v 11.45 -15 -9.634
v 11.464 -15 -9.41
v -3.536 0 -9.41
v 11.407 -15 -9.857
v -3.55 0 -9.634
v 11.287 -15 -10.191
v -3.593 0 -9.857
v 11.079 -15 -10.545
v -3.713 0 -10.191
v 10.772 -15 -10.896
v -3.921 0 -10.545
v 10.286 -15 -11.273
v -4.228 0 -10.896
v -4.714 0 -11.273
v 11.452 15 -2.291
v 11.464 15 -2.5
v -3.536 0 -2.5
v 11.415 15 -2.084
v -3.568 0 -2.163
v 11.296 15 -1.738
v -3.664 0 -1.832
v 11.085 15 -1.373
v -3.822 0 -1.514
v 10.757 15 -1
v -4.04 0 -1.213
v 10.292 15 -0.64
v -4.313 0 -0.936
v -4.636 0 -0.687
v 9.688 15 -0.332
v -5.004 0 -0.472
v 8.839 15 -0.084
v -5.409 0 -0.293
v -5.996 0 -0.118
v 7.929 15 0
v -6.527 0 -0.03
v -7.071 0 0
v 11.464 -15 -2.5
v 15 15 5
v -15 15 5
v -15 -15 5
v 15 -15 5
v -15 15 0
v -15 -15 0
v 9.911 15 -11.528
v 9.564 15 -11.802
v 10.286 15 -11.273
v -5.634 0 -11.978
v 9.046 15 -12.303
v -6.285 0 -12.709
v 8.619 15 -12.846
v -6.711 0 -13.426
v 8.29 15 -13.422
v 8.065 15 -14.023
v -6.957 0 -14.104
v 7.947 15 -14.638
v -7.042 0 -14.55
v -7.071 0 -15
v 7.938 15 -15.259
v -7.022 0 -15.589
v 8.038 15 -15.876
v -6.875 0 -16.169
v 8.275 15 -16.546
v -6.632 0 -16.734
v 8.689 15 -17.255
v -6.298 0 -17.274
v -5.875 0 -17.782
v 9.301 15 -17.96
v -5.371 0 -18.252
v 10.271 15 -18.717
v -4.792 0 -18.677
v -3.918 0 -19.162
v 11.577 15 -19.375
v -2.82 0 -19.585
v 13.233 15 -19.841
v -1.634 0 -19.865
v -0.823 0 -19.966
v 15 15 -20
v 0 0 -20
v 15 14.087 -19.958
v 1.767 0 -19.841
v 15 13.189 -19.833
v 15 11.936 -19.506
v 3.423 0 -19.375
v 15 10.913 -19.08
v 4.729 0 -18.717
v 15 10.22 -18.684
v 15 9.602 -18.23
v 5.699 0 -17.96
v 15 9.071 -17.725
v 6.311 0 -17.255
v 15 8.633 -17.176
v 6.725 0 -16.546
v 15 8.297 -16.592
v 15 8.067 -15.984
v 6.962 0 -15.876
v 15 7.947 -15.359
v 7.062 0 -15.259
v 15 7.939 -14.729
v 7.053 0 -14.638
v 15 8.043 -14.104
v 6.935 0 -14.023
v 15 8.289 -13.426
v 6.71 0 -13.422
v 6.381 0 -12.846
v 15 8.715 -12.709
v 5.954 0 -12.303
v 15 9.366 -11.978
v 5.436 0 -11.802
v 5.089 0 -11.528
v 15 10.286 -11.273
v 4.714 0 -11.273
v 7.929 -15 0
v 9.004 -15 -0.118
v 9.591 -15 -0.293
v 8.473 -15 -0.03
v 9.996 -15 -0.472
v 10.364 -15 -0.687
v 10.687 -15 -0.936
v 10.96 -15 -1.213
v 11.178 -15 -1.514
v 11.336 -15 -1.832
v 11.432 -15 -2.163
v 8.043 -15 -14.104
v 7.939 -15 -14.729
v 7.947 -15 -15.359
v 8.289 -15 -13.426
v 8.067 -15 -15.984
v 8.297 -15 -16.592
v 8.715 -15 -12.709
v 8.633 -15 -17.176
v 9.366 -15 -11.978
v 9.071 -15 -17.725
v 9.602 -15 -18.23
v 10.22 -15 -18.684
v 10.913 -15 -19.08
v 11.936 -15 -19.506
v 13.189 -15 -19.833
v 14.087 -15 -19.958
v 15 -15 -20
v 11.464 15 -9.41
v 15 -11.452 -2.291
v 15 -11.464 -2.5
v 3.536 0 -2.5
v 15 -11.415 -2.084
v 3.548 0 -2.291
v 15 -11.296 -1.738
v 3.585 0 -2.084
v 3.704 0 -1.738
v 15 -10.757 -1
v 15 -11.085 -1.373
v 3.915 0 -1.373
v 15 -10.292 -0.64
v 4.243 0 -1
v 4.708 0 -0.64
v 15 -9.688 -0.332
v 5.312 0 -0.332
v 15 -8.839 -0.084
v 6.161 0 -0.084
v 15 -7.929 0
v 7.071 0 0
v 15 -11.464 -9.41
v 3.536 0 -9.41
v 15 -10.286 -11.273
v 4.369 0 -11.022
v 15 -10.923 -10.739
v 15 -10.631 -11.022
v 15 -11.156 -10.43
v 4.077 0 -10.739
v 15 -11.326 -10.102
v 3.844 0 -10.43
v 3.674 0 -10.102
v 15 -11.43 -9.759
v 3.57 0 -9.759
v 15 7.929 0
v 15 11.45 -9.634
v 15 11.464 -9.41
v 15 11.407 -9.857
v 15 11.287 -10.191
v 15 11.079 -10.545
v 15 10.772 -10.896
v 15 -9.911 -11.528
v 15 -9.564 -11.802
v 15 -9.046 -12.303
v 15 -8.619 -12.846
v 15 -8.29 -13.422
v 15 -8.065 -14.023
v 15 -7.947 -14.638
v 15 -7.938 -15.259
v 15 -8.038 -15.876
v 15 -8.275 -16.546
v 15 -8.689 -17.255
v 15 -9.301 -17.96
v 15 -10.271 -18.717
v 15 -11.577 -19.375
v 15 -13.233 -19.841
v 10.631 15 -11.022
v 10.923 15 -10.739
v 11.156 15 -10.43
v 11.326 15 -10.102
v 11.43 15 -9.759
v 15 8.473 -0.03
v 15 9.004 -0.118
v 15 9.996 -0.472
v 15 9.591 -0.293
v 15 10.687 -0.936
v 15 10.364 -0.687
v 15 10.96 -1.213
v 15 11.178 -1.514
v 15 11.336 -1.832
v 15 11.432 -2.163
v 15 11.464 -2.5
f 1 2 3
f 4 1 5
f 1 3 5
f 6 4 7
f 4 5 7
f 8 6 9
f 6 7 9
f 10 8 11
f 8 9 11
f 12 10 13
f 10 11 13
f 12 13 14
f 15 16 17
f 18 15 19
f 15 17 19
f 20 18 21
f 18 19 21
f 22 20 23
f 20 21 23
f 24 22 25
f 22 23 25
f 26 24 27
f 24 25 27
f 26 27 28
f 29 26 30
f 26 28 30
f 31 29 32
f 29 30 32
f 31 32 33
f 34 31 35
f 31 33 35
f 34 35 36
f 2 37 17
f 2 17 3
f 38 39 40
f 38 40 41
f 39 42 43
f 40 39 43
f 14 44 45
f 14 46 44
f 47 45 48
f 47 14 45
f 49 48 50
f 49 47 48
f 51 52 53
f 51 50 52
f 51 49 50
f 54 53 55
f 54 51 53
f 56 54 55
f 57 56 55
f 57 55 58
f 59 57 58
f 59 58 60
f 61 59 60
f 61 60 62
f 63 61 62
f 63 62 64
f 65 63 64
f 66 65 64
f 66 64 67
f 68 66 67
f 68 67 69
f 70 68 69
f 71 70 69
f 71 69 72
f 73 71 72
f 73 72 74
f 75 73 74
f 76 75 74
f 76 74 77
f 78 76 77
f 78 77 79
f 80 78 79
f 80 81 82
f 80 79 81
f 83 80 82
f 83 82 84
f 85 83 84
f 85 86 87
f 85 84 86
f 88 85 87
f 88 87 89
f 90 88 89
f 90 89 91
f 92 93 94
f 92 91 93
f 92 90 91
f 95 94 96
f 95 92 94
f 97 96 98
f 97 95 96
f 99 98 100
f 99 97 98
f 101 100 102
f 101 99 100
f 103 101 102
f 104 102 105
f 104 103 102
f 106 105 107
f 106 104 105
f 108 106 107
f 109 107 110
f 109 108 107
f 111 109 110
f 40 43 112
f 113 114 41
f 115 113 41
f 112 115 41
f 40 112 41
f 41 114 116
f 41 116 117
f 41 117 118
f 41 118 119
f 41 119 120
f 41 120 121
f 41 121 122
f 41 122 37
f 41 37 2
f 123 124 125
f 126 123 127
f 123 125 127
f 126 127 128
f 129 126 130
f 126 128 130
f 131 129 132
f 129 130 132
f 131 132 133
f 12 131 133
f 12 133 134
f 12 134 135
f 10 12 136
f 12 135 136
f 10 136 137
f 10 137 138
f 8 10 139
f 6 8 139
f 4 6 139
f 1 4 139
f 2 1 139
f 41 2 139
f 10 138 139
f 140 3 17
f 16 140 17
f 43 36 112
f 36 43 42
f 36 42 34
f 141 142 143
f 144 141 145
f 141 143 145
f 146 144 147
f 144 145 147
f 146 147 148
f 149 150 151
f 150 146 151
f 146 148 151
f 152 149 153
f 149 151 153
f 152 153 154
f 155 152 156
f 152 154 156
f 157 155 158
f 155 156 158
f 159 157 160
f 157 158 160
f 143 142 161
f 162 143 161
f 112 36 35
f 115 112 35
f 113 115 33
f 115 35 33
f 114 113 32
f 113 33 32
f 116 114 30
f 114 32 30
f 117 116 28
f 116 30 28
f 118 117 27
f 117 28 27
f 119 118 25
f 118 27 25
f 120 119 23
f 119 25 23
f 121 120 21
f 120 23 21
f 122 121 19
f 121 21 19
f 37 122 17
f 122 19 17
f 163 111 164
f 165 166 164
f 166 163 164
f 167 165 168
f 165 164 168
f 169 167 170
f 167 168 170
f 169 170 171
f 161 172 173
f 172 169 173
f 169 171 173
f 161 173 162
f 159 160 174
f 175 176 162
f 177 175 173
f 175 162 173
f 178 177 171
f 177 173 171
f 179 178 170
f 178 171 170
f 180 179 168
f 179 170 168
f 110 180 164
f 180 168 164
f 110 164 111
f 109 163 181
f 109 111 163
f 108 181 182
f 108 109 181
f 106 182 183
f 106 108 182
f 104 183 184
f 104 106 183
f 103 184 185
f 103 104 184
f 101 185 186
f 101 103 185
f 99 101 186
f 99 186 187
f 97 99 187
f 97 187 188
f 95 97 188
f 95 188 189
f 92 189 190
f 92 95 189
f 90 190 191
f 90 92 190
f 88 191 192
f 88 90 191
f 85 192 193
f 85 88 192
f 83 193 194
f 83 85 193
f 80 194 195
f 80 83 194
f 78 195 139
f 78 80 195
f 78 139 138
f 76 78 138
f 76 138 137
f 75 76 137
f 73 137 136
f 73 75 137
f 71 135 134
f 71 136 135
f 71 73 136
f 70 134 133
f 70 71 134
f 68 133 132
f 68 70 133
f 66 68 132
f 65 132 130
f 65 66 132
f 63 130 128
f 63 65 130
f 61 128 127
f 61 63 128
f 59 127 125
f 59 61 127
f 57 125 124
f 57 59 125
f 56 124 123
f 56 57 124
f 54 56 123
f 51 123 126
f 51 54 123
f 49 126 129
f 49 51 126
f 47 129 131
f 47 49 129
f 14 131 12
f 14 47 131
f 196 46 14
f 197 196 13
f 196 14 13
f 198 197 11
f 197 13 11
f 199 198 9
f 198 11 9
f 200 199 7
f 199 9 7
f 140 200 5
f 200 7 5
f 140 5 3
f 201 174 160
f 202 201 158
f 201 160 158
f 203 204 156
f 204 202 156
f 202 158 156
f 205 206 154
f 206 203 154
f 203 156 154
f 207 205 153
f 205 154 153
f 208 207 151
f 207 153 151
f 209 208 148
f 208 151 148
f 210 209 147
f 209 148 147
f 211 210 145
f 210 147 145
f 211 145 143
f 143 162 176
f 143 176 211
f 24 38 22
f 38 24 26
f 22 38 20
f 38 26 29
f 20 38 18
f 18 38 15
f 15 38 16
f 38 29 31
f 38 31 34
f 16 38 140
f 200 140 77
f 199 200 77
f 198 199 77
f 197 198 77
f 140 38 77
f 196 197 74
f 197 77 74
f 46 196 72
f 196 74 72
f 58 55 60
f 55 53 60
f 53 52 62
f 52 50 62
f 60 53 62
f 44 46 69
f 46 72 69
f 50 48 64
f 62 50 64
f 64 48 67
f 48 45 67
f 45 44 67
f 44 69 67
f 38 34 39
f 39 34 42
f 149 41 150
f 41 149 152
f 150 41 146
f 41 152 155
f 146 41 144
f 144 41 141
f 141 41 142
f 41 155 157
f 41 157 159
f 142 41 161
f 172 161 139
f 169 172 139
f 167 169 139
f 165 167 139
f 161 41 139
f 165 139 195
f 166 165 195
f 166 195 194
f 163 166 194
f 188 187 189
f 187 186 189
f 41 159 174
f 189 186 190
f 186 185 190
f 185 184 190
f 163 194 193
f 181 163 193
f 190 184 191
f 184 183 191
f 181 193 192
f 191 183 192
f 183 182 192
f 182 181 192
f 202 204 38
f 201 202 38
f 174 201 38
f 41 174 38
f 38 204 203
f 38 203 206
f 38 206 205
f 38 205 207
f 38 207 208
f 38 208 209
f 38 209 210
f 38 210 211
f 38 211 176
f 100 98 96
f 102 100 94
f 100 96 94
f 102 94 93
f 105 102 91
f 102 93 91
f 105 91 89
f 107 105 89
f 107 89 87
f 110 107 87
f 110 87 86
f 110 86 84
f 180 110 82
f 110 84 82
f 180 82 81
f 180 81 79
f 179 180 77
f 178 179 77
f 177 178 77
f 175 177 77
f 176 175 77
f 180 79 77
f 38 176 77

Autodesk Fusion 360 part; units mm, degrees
sketch "Sketch1" plane through (0, 0, 0) normal (0, 0, 1) x (1, 0, 0)
  line L0 (-15, -15) -> (15, -15)
  line L1 (15, -15) -> (15, 15)
  line L2 (15, 15) -> (-15, 15)
  line L3 (-15, 15) -> (-15, -15)
  line L4 (-15, -15) -> (15, 15) construction
  line L5 (15, -15) -> (-15, 15) construction
  line L6 (-25, 25) -> (25, 25)
  line L7 (25, 25) -> (25, -25)
  line L8 (25, -25) -> (-25, -25)
  line L9 (-25, -25) -> (-25, 25)
  line L10 (15, -15) -> (25, -25) construction
  line L11 (-25, 25) -> (-15, 15) construction
  line L12 (15, 15) -> (25, 25) construction
  line L13 (-15, -15) -> (-25, -25) construction
  dimension "d1" = 30
  dimension "d2" = 30
  dimension "d23" = 10
  dimension "d24" = 10
  dimension "d25" = 10
  dimension "d26" = 10
extrude "Extrude1" add sketch "Sketch1" along normal blind 5 contours L0 L1 L2 L3
ref_plane "WorkPlane1" through (0, 0, 0) normal (0.7071, 0.7071, 0) x (-0.7071, 0.7071, 0)
ref_plane "WorkPlane2" through (0, 0, 0) normal (0.7071, -0.7071, 0) x (0.7071, 0.7071, 0)
sketch "Sketch2" plane through (0, 0, 0) normal (0.7071, 0.7071, 0) x (-0.7071, 0.7071, 0)
  circle A0 centre (0, -15) radius 5
  line L0 (2.5, -10.6699) -> (2.5, -2.5)
  line L1 (-2.5, -10.6699) -> (-2.5, -2.5)
  arc A1 (5, 0) -> (2.5, -2.5) centre (5, -2.5) ccw
  arc A2 (-2.5, -2.5) -> (-5, 0) centre (-5, -2.5) ccw
  line L2 (0, 0) -> (0, -15) construction
  line L3 (0, -7.5) -> (2.5, -7.5) construction
  line L4 (0, -7.5) -> (-2.5, -7.5) construction
  line L5 (21.2132, 0) -> (0, 0)
  line L6 (0, 0) -> (-21.2132, 0)
  line L7 (5, -2.5) -> (-5, -2.5) construction
  arc A3 (2.5, -9.4098) -> (3.3333, -11.2732) centre (5, -9.4098) ccw
  arc A4 (-3.3333, -11.2732) -> (-2.5, -9.4098) centre (-5, -9.4098) ccw
  line L8 (-17.2446, 0) -> (-17.2446, -26.2222)
  line L9 (-17.2446, -26.2222) -> (15.3661, -26.2222)
  line L10 (15.3661, -26.2222) -> (15.3661, 0)
  line L11 (0, -20) -> (0, -26.2222)
  dimension "d7" = 10
  dimension "d8" = 5
  dimension "d9" = 15
  dimension "d14" = 2.5
extrude "Extrude2" add sketch "Sketch2" along normal blind 25 and the other way blind 5 contours A0 | A0 L0 A3 | A0 L0 L1 A1 A2 L5 L6 | A0 L1 A4
sketch "Sketch3" plane through (0, 0, 0) normal (0.7071, -0.7071, 0) x (0.7071, 0.7071, 0)
  circle A0 centre (0, -15) radius 5
  line L0 (0, 0) -> (0, -15) construction
  line L1 (-2.5, -2.5) -> (-2.5, -9.4098)
  line L2 (2.5, -2.5) -> (2.5, -9.4098)
  line L3 (-21.2132, 0) -> (0, 0)
  line L4 (0, -5.6591) -> (2.5, -5.6591) construction
  line L5 (0, -5.6591) -> (-2.5, -5.6591) construction
  arc A1 (-3.3333, -11.2732) -> (-2.5, -9.4098) centre (-5, -9.4098) ccw
  arc A2 (2.5, -9.4098) -> (3.3333, -11.2732) centre (5, -9.4098) ccw
  arc A3 (-2.5, -2.5) -> (-5, 0) centre (-5, -2.5) ccw
  line L6 (0, 0) -> (16.2132, 0)
  arc A4 (5, 0) -> (2.5, -2.5) centre (5, -2.5) ccw
  line L7 (-15.7318, 0) -> (-15.7318, -22.3804)
  line L8 (-15.7318, -22.3804) -> (13.46, -22.3804)
  line L9 (13.46, -22.3804) -> (13.46, 0)
  line L10 (0, -20) -> (0, -22.3804)
  line L11 (0, 0) -> (0, -26.2222)
  dimension "d12" = 15
  dimension "d13" = 10
  dimension "d15" = 5
  dimension "d16" = 2.5
extrude "Extrude3" add sketch "Sketch3" along normal blind 25 and the other way blind 5 contours A0 L11 | A0 L2 A2 L6 A4 L11 | A0 L11 | A0 L1 L3 A1 A3 L11
extrude "Extrude4" cut sketch "Sketch1" against normal blind 20
extrude "Extrude5" cut sketch "Sketch2" along normal mid plane 30 contours A0 L0 A1 L5 A3 L9 L10 L11
extrude "Extrude6" cut sketch "Sketch3" along normal mid plane 30 contours A0 L1 L3 A1 A3 L7 L8 L10 L11
equation "d23 = d26"
equation "d24 = d26"
equation "d25 = d26"
